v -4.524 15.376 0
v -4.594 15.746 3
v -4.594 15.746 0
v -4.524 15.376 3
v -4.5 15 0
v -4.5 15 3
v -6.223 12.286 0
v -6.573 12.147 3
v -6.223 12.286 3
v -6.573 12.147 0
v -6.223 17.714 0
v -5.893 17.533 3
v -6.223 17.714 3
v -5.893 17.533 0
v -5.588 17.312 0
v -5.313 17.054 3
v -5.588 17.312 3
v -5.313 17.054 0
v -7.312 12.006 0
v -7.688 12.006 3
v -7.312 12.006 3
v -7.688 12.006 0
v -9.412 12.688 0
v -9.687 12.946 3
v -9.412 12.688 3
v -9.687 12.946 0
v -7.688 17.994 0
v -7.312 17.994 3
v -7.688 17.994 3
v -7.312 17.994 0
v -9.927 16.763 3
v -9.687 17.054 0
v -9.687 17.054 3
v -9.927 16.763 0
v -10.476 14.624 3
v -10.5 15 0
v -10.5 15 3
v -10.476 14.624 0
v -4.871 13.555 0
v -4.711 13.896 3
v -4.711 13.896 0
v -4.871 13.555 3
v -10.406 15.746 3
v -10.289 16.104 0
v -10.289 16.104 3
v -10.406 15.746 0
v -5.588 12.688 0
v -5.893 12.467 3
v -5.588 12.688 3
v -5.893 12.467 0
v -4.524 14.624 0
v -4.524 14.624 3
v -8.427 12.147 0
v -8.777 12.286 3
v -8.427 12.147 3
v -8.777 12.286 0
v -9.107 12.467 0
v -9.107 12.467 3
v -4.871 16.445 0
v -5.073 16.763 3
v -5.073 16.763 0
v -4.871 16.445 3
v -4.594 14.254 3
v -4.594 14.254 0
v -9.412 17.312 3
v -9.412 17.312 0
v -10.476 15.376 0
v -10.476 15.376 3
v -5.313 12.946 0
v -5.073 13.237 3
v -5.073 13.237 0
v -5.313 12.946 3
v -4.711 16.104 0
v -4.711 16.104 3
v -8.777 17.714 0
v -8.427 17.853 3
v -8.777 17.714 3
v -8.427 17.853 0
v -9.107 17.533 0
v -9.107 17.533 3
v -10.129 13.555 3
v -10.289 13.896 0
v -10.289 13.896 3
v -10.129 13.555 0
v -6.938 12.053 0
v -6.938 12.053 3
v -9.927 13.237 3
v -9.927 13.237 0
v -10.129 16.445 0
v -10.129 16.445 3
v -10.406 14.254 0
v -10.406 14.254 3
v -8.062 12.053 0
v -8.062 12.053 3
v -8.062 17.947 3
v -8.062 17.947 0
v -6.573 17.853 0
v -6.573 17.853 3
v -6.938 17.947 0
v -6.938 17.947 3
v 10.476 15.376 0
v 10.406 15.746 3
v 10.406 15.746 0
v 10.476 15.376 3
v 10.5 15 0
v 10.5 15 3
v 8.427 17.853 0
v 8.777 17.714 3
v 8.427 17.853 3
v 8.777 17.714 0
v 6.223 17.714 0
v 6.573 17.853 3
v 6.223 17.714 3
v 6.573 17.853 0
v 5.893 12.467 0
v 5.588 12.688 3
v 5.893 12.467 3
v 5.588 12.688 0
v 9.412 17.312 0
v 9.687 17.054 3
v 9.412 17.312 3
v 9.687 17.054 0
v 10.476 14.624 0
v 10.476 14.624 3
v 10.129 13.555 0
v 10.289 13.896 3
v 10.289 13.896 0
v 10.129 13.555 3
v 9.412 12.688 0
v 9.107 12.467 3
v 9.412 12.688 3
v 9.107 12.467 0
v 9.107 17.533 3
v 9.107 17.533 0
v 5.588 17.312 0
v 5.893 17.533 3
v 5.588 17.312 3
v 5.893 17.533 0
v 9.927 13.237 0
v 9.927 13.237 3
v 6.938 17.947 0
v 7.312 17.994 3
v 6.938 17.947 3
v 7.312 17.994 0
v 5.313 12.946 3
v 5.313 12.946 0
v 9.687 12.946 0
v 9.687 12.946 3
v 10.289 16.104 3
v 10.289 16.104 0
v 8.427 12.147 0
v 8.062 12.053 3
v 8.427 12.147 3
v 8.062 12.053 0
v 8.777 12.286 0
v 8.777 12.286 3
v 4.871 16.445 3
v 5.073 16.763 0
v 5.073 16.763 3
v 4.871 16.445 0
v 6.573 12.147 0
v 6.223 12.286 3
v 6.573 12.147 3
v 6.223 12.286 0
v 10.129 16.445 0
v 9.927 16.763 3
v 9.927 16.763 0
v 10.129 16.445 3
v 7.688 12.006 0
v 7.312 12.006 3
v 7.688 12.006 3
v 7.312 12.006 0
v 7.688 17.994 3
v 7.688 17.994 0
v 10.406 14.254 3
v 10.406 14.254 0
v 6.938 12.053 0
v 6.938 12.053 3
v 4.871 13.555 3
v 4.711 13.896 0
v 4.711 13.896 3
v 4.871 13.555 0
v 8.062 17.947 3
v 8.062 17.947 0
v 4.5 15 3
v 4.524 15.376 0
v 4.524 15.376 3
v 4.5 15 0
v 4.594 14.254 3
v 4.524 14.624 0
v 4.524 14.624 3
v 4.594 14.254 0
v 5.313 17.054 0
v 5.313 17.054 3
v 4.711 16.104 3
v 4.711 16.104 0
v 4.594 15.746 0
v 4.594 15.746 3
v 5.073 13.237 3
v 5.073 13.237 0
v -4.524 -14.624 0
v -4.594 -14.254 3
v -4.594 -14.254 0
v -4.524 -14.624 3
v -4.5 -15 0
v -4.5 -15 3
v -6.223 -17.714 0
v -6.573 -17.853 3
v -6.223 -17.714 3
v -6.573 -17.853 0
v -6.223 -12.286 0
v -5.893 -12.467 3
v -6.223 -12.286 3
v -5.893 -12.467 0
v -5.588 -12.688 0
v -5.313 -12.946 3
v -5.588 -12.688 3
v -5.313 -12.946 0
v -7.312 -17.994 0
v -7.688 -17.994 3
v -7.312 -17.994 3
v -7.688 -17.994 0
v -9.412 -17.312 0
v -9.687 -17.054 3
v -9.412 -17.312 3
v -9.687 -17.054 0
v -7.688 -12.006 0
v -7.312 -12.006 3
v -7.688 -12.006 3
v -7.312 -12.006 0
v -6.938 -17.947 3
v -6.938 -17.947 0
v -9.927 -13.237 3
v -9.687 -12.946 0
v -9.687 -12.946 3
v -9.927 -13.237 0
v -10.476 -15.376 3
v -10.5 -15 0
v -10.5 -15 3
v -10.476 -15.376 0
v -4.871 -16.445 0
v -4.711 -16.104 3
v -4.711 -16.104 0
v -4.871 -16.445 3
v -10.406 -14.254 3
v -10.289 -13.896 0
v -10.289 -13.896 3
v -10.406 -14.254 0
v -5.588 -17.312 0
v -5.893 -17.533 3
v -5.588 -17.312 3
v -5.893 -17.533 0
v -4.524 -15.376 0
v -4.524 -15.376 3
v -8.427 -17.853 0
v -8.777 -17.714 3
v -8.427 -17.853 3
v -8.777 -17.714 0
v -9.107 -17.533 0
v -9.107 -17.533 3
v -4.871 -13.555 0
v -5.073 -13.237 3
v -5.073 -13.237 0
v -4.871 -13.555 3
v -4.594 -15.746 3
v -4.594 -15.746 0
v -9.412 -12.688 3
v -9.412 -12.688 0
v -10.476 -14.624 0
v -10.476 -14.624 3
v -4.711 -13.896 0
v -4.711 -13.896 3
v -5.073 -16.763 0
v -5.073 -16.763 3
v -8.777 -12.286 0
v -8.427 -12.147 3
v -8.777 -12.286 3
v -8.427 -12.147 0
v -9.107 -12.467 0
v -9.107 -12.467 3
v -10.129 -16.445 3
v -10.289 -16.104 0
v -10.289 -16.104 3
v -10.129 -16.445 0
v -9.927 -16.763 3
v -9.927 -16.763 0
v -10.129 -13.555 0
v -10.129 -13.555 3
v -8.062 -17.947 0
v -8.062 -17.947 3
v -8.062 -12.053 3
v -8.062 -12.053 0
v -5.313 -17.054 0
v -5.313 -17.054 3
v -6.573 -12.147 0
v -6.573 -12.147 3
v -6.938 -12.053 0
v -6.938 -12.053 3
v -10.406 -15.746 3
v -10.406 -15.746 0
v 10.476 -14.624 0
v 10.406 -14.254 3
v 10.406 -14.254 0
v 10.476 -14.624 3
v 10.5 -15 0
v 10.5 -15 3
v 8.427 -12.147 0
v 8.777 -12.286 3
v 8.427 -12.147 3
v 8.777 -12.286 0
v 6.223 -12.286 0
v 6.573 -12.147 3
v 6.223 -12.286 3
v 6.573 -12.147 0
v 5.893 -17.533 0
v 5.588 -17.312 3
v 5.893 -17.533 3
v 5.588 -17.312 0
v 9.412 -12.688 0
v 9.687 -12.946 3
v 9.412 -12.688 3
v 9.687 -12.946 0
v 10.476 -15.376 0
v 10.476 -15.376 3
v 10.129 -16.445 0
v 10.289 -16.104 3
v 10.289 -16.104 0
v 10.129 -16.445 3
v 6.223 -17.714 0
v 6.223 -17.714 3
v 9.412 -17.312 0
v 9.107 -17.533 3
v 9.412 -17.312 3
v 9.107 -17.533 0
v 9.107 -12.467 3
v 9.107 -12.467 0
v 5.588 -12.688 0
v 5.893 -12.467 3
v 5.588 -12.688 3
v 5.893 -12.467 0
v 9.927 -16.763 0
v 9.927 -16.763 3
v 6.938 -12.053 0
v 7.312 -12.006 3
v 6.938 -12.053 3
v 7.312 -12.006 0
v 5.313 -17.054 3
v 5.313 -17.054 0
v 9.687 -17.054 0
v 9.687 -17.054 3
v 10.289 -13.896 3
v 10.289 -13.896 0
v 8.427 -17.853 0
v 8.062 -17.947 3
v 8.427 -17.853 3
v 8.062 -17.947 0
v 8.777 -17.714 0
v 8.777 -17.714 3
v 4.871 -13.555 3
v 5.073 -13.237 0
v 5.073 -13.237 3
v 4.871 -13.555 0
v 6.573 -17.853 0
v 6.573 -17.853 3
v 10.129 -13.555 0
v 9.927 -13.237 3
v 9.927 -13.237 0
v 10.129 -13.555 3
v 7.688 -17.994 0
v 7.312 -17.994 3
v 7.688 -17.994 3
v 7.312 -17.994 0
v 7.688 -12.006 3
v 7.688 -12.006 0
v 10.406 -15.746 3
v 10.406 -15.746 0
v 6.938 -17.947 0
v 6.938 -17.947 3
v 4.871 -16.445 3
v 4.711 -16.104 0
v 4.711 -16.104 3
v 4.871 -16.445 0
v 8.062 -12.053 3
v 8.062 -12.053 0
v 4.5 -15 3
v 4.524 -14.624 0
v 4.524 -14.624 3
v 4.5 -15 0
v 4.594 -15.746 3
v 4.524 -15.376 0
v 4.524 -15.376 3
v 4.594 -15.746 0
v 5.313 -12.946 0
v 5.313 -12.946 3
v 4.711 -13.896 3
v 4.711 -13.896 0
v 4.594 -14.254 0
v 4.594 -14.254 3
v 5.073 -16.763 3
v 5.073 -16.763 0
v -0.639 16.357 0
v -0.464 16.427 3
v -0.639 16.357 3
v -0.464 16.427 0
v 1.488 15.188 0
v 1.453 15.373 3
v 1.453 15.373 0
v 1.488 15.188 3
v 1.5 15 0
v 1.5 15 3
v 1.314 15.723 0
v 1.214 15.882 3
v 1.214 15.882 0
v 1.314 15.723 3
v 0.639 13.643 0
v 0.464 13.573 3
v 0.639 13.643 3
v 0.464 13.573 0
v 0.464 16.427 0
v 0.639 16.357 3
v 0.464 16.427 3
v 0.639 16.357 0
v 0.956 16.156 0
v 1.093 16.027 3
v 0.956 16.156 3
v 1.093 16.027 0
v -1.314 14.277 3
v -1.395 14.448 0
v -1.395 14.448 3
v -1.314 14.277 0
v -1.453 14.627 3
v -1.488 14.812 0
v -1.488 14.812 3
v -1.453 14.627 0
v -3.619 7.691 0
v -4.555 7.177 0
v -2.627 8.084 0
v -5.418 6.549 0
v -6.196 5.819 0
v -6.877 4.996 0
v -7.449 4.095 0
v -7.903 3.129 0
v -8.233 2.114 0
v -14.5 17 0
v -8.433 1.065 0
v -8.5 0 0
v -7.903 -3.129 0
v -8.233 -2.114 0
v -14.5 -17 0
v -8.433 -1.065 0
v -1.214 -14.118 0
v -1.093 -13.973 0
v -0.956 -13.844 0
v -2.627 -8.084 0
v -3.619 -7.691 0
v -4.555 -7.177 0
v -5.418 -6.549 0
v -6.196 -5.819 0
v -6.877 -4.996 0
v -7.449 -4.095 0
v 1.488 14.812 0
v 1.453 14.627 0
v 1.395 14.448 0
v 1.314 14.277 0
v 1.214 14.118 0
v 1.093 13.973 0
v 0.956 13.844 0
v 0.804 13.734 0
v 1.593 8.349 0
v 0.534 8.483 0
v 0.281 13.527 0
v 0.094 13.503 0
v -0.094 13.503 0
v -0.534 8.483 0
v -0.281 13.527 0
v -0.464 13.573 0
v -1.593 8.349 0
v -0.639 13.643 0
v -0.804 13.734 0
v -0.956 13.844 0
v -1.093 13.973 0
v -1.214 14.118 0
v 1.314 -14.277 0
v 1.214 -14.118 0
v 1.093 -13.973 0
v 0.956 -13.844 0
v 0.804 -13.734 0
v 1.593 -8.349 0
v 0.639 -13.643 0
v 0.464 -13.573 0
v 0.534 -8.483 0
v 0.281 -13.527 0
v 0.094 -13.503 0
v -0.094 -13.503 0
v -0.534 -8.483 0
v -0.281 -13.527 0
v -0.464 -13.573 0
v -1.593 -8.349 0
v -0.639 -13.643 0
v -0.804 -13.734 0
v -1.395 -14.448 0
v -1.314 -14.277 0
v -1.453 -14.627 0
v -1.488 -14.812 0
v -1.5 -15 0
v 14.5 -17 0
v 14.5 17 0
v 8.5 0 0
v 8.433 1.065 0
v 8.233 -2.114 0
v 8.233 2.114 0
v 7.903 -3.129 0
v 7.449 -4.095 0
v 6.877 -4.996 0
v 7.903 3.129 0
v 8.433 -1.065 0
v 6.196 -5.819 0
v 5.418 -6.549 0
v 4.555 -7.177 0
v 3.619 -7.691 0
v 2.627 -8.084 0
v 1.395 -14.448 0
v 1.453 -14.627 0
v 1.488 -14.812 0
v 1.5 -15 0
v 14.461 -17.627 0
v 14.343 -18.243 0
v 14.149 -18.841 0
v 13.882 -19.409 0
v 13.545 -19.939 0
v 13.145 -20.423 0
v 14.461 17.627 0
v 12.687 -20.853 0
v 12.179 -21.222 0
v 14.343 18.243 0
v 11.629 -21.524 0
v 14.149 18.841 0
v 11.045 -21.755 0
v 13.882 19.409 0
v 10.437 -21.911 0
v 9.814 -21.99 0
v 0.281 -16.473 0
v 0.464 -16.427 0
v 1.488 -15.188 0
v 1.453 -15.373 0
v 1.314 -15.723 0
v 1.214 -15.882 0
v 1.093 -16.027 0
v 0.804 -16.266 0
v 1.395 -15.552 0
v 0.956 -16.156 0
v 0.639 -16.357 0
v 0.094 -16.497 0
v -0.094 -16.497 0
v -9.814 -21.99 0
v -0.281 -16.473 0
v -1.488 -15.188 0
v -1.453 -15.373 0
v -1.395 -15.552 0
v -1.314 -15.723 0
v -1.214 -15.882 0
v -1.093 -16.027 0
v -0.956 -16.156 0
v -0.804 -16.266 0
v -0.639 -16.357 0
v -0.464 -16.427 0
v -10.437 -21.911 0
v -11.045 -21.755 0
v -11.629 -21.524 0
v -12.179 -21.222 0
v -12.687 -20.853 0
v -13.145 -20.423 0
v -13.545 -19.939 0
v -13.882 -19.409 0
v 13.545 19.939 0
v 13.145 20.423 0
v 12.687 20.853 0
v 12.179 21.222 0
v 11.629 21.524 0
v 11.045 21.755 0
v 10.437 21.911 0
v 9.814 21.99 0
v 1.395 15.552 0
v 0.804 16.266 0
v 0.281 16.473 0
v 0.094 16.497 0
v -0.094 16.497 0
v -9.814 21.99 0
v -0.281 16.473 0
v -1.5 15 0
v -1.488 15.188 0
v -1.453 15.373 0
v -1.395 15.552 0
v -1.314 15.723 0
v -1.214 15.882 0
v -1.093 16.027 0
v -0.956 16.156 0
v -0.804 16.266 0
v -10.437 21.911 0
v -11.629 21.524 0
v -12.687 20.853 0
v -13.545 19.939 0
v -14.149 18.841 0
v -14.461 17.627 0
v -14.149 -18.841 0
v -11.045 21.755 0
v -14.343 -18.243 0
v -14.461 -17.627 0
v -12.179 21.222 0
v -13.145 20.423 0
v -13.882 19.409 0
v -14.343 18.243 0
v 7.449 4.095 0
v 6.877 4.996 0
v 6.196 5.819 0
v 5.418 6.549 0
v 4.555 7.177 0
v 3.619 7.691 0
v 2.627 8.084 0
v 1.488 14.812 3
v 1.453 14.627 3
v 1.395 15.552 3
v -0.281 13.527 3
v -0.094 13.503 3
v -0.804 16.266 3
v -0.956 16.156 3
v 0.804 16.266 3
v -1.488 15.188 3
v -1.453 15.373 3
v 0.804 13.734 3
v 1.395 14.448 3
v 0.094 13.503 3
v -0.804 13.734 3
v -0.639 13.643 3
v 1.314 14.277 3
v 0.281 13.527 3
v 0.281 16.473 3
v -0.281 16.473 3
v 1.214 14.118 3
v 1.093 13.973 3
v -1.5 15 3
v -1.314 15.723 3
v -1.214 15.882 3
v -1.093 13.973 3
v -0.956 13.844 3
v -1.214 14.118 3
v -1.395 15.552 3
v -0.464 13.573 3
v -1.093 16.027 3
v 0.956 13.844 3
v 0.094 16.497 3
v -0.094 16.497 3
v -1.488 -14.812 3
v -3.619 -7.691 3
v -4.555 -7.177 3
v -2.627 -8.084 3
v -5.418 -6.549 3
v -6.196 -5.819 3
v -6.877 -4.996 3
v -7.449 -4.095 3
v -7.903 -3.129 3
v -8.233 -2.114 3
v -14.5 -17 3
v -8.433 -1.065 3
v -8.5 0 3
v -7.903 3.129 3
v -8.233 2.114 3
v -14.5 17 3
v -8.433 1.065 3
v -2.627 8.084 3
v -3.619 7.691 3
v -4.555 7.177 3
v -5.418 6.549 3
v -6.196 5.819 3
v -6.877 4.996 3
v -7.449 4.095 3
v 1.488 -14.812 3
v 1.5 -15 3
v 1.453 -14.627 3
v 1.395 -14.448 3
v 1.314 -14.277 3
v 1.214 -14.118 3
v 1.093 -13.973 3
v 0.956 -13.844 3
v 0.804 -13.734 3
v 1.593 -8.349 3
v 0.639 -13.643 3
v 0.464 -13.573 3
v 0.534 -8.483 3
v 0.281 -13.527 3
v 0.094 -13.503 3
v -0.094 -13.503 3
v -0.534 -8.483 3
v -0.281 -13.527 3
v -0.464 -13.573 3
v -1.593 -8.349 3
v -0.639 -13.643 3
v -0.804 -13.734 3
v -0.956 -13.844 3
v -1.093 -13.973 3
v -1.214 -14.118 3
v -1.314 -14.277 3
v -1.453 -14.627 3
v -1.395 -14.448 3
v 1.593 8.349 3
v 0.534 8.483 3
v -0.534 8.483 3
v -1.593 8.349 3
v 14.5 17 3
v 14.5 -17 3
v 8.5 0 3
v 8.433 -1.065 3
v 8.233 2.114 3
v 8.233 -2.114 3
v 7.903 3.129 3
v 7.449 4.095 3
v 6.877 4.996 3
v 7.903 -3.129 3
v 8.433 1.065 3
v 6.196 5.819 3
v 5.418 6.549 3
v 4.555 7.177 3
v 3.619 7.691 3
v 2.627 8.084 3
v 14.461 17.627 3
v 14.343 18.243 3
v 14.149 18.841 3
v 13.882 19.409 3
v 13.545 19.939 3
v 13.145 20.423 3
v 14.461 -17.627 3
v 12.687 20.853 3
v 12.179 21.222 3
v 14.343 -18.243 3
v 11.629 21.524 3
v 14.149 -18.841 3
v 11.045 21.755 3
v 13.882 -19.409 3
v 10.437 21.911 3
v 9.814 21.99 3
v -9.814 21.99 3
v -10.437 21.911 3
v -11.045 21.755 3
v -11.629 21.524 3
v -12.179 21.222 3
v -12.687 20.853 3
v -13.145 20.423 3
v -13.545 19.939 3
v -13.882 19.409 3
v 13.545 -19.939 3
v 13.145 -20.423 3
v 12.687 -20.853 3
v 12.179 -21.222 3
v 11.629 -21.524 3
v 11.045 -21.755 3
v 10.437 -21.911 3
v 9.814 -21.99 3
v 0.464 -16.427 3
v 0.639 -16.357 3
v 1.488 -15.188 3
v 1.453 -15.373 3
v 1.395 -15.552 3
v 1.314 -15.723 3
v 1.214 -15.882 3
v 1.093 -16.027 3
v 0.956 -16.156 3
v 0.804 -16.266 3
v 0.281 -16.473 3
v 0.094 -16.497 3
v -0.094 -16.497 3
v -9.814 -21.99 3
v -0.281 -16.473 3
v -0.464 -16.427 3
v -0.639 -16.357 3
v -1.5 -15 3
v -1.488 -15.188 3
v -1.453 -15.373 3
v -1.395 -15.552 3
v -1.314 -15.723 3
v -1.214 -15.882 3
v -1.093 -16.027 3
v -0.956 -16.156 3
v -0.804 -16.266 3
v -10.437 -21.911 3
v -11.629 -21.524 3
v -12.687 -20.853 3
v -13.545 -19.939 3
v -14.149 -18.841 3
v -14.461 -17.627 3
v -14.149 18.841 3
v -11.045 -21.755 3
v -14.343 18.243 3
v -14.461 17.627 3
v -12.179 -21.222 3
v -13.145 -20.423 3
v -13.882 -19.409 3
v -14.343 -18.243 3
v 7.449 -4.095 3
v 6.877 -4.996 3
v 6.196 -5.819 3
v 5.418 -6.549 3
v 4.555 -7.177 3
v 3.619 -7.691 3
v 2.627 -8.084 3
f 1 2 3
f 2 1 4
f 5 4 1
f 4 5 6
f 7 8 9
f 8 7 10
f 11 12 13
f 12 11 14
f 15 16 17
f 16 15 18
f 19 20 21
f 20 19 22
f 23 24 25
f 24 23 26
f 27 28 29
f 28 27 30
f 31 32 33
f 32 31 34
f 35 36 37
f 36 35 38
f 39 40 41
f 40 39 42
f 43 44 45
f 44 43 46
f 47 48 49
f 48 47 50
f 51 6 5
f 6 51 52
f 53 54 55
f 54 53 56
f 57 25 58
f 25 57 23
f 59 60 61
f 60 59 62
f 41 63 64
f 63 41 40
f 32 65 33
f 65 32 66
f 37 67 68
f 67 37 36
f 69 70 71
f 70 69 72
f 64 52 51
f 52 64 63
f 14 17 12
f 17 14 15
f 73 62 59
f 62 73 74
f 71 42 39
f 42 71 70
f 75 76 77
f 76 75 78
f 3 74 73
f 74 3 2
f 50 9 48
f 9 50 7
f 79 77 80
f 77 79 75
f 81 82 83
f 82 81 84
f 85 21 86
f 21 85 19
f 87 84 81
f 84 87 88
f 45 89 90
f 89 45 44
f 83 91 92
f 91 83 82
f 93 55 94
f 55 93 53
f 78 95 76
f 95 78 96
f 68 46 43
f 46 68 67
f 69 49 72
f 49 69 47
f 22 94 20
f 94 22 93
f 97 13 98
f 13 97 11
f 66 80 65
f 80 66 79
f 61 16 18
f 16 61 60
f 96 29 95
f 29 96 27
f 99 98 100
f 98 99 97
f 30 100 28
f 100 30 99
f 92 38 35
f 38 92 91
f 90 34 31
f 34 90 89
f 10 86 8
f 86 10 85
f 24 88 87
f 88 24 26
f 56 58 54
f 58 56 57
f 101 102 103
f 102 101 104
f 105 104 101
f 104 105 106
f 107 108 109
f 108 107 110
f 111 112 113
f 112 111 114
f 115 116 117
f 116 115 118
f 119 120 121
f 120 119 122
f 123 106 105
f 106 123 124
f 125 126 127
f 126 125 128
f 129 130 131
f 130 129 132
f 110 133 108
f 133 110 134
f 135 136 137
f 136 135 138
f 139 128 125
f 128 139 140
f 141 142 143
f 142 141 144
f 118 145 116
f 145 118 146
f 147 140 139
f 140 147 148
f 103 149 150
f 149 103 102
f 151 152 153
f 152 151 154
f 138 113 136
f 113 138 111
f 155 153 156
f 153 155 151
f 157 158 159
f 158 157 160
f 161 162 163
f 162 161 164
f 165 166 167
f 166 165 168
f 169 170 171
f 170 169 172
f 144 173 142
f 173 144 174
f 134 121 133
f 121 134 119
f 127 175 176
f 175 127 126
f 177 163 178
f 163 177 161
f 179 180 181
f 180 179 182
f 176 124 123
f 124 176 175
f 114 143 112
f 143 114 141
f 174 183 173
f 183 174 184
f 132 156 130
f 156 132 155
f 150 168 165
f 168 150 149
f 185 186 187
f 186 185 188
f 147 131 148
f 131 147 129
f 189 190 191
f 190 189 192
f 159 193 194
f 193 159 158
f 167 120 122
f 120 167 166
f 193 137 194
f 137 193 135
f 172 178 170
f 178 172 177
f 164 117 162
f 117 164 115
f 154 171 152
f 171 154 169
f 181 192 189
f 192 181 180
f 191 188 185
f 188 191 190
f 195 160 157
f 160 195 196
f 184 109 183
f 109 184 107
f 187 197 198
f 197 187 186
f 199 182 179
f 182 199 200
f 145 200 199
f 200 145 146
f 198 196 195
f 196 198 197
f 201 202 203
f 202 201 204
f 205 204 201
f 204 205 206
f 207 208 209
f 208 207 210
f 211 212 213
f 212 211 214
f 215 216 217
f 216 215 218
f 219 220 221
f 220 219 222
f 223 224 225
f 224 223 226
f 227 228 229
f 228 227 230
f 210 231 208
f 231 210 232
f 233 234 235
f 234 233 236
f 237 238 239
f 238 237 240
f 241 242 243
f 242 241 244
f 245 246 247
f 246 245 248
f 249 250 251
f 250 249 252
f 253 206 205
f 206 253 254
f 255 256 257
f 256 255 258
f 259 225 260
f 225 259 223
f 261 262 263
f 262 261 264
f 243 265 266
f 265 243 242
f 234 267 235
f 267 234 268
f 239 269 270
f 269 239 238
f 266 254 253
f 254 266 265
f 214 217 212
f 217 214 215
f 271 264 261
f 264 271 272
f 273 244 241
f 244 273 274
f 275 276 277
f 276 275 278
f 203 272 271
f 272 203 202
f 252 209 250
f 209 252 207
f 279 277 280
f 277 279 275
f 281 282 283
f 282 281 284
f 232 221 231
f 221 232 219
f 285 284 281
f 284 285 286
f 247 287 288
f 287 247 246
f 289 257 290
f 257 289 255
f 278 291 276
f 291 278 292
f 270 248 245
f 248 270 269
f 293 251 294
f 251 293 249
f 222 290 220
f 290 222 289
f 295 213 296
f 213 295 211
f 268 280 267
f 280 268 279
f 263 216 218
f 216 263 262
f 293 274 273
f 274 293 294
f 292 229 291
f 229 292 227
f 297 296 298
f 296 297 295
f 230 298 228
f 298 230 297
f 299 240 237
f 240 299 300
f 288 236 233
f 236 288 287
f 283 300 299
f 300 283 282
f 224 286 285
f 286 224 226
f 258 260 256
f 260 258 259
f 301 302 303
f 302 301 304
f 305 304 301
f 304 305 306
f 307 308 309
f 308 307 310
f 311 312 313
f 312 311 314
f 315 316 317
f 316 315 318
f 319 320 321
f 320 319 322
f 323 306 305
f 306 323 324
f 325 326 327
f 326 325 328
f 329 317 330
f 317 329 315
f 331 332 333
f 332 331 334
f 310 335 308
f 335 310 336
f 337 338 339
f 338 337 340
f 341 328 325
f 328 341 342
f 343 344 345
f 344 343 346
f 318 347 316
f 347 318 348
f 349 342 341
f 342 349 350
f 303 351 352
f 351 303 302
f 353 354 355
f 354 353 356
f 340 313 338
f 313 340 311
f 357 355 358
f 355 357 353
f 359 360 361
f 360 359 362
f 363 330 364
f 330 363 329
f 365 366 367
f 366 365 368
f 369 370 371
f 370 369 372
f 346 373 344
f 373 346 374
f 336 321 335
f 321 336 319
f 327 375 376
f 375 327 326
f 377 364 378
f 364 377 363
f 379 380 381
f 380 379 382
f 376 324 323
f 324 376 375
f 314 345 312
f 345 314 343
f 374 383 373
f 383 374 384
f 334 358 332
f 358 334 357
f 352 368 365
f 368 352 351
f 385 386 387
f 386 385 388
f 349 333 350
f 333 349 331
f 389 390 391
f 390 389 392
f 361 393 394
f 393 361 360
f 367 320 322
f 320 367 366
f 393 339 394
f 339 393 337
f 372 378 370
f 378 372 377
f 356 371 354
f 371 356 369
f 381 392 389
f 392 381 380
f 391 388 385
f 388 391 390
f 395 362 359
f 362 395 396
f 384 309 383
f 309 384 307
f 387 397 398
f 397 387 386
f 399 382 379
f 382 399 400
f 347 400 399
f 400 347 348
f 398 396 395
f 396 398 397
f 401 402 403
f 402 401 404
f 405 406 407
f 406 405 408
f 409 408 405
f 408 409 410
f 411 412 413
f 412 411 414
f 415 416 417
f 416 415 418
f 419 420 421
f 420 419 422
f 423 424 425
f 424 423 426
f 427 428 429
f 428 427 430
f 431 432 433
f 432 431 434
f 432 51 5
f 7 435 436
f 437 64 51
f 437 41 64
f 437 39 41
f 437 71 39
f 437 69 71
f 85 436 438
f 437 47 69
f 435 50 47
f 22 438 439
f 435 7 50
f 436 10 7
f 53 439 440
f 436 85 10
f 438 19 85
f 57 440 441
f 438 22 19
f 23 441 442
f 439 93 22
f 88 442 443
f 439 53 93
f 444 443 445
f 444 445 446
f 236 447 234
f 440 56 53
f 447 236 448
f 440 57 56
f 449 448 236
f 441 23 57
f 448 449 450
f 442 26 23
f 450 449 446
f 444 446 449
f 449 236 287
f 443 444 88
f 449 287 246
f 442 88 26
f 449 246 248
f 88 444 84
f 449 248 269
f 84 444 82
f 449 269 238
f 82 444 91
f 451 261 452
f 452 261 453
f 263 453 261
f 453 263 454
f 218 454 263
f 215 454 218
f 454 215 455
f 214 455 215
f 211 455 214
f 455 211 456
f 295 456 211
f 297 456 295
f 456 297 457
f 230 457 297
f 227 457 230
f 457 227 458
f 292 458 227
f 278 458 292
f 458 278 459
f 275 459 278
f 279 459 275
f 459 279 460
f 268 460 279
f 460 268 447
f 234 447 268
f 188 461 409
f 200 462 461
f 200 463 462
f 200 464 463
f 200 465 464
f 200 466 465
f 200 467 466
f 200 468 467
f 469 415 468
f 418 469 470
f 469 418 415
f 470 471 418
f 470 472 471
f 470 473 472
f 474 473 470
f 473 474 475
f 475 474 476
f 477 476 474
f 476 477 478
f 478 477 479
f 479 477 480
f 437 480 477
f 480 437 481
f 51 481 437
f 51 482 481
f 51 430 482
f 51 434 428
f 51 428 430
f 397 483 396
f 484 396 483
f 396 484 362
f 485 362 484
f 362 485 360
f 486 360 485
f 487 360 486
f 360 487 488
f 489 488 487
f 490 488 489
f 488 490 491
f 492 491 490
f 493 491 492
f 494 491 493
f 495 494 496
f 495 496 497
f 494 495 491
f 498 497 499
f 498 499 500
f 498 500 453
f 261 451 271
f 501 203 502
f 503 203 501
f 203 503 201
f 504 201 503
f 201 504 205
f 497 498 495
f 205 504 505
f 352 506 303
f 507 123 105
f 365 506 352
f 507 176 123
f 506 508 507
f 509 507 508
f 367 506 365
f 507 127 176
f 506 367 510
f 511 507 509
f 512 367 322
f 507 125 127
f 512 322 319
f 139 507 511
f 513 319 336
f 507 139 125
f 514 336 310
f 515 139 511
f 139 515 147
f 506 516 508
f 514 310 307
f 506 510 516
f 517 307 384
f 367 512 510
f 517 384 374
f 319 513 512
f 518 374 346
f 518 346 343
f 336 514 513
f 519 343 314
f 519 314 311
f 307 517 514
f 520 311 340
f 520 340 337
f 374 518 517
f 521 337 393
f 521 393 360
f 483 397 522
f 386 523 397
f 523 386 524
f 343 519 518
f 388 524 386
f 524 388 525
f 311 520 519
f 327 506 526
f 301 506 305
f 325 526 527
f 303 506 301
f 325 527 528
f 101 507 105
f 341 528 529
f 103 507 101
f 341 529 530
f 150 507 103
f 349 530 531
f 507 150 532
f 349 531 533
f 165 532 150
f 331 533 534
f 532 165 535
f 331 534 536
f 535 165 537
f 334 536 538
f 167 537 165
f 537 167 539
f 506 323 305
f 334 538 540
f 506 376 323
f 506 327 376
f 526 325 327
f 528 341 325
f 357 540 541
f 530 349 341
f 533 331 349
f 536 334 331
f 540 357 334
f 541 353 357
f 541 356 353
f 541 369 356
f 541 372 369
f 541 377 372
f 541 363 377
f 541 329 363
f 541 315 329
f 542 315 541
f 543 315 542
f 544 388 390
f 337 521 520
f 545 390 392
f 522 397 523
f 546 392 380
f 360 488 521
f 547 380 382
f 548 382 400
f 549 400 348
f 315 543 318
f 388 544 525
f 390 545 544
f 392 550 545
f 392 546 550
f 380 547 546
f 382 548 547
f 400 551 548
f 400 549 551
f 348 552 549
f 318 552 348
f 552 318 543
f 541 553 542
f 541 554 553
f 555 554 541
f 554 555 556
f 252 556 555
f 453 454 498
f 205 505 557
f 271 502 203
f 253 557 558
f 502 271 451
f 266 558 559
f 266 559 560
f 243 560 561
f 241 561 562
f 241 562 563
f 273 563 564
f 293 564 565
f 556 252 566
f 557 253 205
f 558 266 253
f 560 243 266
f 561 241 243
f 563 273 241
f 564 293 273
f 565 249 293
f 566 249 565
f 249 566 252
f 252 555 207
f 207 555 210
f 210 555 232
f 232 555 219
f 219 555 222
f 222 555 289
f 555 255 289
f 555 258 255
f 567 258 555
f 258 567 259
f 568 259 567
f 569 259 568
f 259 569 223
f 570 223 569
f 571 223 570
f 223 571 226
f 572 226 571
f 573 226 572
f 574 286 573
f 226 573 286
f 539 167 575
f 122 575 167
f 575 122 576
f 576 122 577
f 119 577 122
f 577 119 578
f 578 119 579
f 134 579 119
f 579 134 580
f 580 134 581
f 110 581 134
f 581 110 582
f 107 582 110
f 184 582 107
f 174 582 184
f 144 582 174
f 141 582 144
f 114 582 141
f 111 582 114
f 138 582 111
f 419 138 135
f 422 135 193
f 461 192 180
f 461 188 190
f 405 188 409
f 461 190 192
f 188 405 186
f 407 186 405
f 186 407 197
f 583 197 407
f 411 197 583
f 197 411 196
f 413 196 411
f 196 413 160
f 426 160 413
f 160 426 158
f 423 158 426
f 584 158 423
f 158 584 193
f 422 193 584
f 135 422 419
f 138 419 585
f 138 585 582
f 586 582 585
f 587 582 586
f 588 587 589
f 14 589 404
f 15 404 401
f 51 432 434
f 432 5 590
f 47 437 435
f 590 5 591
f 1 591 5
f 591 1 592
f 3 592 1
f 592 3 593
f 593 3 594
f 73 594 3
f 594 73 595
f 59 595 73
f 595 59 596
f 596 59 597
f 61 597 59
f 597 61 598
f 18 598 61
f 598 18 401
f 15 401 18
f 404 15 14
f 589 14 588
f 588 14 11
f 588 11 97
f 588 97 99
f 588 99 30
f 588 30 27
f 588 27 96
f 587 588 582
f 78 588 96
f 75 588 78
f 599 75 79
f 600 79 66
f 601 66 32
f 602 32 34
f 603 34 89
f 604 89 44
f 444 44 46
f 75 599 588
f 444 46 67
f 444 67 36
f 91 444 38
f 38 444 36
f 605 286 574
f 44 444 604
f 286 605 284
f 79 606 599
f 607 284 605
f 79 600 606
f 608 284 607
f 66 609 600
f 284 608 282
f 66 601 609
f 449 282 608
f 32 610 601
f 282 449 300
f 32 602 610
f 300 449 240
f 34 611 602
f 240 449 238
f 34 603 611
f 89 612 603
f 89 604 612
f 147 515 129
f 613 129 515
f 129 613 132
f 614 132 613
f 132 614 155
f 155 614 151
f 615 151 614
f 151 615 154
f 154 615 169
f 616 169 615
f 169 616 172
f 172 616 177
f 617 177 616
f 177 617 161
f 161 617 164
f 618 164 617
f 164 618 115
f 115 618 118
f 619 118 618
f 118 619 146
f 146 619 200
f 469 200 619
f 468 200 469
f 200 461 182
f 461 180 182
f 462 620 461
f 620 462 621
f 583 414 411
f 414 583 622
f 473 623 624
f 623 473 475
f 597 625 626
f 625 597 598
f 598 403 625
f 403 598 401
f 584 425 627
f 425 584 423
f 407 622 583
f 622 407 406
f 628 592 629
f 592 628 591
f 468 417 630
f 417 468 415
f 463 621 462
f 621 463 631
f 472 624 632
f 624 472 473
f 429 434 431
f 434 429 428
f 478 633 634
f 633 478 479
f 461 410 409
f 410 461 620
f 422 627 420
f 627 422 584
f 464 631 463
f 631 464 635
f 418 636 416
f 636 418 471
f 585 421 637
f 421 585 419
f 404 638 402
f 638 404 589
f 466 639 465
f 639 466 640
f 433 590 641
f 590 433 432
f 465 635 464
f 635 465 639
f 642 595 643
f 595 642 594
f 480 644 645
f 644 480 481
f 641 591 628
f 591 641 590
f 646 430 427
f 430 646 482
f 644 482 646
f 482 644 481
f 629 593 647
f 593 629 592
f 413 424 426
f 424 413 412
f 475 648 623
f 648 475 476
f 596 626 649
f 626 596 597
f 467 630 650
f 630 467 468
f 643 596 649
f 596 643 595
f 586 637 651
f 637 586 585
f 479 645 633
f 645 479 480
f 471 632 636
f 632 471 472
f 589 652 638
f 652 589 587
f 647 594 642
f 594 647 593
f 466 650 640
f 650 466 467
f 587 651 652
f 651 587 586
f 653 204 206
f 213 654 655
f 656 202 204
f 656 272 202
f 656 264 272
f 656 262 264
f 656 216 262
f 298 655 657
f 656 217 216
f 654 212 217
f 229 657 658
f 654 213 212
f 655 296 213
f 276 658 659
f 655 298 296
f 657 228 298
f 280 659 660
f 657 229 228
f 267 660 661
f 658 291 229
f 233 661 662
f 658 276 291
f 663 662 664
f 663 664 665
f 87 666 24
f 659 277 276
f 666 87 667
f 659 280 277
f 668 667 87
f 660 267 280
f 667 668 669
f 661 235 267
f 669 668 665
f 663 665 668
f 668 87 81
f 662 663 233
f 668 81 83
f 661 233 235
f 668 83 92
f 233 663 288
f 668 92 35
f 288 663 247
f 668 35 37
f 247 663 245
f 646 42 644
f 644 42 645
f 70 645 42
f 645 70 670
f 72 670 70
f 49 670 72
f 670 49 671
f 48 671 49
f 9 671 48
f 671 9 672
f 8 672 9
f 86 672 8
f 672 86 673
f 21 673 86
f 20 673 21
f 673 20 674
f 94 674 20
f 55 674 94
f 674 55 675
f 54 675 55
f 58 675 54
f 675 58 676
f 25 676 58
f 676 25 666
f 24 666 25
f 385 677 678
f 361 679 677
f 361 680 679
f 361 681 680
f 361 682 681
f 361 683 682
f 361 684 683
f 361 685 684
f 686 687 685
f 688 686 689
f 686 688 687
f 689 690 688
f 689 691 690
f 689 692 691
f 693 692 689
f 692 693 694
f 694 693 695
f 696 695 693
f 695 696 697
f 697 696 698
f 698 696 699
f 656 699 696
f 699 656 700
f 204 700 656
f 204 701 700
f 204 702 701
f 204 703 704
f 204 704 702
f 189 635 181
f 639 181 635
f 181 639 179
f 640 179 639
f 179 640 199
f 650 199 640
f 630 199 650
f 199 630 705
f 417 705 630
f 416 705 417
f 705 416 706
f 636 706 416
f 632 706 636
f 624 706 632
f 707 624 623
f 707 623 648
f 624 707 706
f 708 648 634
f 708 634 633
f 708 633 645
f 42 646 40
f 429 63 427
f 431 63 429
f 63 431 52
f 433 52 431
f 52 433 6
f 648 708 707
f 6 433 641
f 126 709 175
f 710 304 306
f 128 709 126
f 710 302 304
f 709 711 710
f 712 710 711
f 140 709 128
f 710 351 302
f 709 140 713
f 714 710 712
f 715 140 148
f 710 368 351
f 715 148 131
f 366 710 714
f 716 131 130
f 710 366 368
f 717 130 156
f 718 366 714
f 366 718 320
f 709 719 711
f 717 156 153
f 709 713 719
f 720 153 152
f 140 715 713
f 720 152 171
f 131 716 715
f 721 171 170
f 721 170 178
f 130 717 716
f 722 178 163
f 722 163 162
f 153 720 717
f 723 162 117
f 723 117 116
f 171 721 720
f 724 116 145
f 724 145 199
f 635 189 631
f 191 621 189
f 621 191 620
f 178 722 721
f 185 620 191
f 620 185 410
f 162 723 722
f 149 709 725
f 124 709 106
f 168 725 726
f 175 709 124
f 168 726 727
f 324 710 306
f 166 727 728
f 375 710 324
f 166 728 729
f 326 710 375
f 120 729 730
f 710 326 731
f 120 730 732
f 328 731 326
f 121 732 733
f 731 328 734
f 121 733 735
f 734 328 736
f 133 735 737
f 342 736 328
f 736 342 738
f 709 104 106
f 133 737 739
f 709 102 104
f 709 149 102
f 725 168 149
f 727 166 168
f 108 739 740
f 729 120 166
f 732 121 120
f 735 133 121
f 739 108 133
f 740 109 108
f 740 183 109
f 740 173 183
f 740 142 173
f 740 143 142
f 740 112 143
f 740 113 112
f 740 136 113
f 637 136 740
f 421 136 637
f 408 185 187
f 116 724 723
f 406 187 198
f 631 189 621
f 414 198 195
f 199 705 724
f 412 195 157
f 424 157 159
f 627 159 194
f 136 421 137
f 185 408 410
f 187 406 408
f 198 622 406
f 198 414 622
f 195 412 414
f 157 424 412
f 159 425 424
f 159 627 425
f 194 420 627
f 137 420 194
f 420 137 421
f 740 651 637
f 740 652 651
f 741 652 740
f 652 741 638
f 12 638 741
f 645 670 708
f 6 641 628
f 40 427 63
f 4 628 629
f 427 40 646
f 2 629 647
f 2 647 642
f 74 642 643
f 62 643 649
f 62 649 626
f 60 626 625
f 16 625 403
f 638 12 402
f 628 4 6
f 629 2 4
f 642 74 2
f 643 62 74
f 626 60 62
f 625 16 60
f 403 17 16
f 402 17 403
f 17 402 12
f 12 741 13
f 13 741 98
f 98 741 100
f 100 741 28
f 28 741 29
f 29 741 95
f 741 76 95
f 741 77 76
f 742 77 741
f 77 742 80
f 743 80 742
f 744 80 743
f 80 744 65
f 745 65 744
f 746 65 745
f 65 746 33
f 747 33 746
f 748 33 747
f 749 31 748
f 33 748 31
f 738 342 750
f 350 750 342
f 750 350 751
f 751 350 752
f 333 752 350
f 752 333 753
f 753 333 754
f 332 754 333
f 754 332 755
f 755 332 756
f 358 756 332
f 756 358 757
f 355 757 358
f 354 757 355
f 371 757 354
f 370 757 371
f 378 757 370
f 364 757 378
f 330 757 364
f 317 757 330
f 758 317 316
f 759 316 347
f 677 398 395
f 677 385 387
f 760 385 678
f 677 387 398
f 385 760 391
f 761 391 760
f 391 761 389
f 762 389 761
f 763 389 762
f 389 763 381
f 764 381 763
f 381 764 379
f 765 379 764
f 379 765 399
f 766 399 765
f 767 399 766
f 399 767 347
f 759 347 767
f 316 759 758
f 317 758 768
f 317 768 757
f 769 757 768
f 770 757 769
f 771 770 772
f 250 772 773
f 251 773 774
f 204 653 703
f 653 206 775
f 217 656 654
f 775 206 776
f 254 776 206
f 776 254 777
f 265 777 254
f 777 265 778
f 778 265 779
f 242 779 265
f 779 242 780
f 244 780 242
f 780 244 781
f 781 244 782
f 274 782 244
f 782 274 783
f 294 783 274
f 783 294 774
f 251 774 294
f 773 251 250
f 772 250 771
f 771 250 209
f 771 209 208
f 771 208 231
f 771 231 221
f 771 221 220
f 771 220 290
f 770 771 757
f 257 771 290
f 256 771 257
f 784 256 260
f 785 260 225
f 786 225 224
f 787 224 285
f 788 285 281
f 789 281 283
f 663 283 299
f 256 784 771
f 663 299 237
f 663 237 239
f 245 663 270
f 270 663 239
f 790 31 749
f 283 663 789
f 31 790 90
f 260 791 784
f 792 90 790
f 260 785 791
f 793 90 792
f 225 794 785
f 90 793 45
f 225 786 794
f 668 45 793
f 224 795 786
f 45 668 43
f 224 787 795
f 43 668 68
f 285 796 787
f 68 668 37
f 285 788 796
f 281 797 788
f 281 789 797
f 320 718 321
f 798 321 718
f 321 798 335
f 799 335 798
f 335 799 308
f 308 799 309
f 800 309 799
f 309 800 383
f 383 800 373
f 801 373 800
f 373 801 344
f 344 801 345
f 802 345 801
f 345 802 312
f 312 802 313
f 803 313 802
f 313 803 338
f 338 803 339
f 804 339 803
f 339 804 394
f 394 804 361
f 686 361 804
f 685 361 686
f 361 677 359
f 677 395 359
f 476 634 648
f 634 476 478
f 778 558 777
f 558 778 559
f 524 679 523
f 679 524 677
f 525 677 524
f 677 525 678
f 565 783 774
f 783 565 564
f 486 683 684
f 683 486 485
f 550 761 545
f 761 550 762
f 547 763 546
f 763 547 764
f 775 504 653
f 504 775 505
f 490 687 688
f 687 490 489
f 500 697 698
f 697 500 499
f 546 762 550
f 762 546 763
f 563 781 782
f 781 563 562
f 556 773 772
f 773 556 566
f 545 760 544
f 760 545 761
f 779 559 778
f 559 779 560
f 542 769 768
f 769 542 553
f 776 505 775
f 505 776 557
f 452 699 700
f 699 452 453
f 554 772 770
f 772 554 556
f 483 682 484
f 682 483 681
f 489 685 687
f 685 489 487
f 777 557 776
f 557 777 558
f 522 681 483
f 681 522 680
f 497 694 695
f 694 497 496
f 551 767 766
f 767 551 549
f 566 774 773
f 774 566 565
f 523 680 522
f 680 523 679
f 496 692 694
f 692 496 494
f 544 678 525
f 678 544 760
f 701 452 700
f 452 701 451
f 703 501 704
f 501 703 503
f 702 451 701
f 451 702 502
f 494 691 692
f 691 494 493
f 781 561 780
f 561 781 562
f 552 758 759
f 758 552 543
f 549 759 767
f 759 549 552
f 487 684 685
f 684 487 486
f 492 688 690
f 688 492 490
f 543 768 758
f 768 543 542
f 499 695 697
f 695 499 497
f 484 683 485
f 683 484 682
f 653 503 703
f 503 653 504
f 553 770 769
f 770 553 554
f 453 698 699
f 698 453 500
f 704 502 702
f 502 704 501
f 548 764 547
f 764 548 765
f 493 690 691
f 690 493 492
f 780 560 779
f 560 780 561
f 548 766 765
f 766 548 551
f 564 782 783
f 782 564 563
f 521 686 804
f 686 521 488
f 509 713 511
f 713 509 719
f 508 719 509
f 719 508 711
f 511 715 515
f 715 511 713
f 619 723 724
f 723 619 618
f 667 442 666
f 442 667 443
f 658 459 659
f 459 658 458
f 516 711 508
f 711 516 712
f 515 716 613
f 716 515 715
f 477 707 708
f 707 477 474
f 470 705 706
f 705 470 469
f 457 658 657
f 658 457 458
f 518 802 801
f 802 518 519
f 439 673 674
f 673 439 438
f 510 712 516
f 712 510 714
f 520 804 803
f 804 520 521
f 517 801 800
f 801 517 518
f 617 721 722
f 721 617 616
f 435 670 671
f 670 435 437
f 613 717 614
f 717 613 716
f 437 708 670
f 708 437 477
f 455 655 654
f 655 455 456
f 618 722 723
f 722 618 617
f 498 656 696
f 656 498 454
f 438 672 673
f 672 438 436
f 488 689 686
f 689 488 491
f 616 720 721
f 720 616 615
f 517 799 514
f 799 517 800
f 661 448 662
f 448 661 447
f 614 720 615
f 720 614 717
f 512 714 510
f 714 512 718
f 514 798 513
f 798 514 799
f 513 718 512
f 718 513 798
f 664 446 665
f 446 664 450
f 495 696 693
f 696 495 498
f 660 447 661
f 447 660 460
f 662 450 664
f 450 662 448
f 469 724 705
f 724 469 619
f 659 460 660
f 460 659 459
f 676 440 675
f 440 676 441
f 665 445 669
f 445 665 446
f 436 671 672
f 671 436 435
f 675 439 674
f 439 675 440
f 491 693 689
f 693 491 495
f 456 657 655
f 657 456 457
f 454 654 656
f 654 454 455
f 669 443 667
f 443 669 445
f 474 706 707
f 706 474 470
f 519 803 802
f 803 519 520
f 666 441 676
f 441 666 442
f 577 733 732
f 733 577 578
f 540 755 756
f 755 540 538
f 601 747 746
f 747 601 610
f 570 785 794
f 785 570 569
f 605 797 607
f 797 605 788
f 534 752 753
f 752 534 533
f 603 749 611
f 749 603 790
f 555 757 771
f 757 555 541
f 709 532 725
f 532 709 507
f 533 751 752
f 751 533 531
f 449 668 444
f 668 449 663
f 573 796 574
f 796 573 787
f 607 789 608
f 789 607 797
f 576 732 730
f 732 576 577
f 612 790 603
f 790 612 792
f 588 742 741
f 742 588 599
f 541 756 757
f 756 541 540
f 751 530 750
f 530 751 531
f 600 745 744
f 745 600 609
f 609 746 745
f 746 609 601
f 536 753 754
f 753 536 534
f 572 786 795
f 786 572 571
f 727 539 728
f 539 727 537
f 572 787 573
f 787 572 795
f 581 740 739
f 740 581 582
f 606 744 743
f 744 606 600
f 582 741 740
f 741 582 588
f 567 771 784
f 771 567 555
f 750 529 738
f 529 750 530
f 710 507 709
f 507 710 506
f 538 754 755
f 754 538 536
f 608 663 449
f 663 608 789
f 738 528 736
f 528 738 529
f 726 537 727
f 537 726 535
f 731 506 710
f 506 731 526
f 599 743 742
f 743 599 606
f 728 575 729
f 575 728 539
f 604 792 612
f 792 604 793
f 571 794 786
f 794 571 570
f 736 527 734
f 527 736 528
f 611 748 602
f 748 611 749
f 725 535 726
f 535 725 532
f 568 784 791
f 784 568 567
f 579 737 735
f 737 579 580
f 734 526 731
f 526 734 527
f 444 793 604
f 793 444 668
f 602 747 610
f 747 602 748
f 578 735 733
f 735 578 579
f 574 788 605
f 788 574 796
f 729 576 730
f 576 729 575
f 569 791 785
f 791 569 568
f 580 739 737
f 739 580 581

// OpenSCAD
$fn = 50;


difference() {
	union() {
		hull() {
			translate(v = [-9.5000000000, 17.0000000000, 0]) {
				cylinder(h = 3, r = 5);
			}
			translate(v = [9.5000000000, 17.0000000000, 0]) {
				cylinder(h = 3, r = 5);
			}
			translate(v = [-9.5000000000, -17.0000000000, 0]) {
				cylinder(h = 3, r = 5);
			}
			translate(v = [9.5000000000, -17.0000000000, 0]) {
				cylinder(h = 3, r = 5);
			}
		}
	}
	union() {
		#translate(v = [-7.5000000000, 15.0000000000, 0]) {
			cylinder(h = 3, r = 3.0000000000);
		}
		#translate(v = [7.5000000000, 15.0000000000, 0]) {
			cylinder(h = 3, r = 3.0000000000);
		}
		#translate(v = [-7.5000000000, -15.0000000000, 0]) {
			cylinder(h = 3, r = 3.0000000000);
		}
		#translate(v = [7.5000000000, -15.0000000000, 0]) {
			cylinder(h = 3, r = 3.0000000000);
		}
		#translate(v = [-7.5000000000, -15.0000000000, -100.0000000000]) {
			cylinder(h = 200, r = 3.0000000000);
		}
		#translate(v = [-7.5000000000, 15.0000000000, -100.0000000000]) {
			cylinder(h = 200, r = 3.0000000000);
		}
		#translate(v = [7.5000000000, -15.0000000000, -100.0000000000]) {
			cylinder(h = 200, r = 3.0000000000);
		}
		#translate(v = [7.5000000000, 15.0000000000, -100.0000000000]) {
			cylinder(h = 200, r = 3.0000000000);
		}
		#translate(v = [-7.5000000000, 15.0000000000, 0]) {
			cylinder(h = 3, r = 1.5000000000);
		}
		#translate(v = [0.0000000000, 15.0000000000, 0]) {
			cylinder(h = 3, r = 1.5000000000);
		}
		#translate(v = [7.5000000000, 15.0000000000, 0]) {
			cylinder(h = 3, r = 1.5000000000);
		}
		#translate(v = [-7.5000000000, -15.0000000000, 0]) {
			cylinder(h = 3, r = 1.5000000000);
		}
		#translate(v = [0.0000000000, -15.0000000000, 0]) {
			cylinder(h = 3, r = 1.5000000000);
		}
		#translate(v = [7.5000000000, -15.0000000000, 0]) {
			cylinder(h = 3, r = 1.5000000000);
		}
		#translate(v = [-7.5000000000, 15.0000000000, 0]) {
			cylinder(h = 3, r = 1.5000000000);
		}
		#translate(v = [0.0000000000, 15.0000000000, 0]) {
			cylinder(h = 3, r = 1.5000000000);
		}
		#translate(v = [7.5000000000, 15.0000000000, 0]) {
			cylinder(h = 3, r = 1.5000000000);
		}
		#translate(v = [-7.5000000000, -15.0000000000, 0]) {
			cylinder(h = 3, r = 1.5000000000);
		}
		#translate(v = [0.0000000000, -15.0000000000, 0]) {
			cylinder(h = 3, r = 1.5000000000);
		}
		#translate(v = [7.5000000000, -15.0000000000, 0]) {
			cylinder(h = 3, r = 1.5000000000);
		}
		#translate(v = [-7.5000000000, 15.0000000000, 0]) {
			cylinder(h = 3, r = 1.5000000000);
		}
		#translate(v = [0.0000000000, 15.0000000000, 0]) {
			cylinder(h = 3, r = 1.5000000000);
		}
		#translate(v = [7.5000000000, 15.0000000000, 0]) {
			cylinder(h = 3, r = 1.5000000000);
		}
		#translate(v = [-7.5000000000, -15.0000000000, 0]) {
			cylinder(h = 3, r = 1.5000000000);
		}
		#translate(v = [0.0000000000, -15.0000000000, 0]) {
			cylinder(h = 3, r = 1.5000000000);
		}
		#translate(v = [7.5000000000, -15.0000000000, 0]) {
			cylinder(h = 3, r = 1.5000000000);
		}
		#cylinder(h = 3, r = 8.5000000000);
	}
}
